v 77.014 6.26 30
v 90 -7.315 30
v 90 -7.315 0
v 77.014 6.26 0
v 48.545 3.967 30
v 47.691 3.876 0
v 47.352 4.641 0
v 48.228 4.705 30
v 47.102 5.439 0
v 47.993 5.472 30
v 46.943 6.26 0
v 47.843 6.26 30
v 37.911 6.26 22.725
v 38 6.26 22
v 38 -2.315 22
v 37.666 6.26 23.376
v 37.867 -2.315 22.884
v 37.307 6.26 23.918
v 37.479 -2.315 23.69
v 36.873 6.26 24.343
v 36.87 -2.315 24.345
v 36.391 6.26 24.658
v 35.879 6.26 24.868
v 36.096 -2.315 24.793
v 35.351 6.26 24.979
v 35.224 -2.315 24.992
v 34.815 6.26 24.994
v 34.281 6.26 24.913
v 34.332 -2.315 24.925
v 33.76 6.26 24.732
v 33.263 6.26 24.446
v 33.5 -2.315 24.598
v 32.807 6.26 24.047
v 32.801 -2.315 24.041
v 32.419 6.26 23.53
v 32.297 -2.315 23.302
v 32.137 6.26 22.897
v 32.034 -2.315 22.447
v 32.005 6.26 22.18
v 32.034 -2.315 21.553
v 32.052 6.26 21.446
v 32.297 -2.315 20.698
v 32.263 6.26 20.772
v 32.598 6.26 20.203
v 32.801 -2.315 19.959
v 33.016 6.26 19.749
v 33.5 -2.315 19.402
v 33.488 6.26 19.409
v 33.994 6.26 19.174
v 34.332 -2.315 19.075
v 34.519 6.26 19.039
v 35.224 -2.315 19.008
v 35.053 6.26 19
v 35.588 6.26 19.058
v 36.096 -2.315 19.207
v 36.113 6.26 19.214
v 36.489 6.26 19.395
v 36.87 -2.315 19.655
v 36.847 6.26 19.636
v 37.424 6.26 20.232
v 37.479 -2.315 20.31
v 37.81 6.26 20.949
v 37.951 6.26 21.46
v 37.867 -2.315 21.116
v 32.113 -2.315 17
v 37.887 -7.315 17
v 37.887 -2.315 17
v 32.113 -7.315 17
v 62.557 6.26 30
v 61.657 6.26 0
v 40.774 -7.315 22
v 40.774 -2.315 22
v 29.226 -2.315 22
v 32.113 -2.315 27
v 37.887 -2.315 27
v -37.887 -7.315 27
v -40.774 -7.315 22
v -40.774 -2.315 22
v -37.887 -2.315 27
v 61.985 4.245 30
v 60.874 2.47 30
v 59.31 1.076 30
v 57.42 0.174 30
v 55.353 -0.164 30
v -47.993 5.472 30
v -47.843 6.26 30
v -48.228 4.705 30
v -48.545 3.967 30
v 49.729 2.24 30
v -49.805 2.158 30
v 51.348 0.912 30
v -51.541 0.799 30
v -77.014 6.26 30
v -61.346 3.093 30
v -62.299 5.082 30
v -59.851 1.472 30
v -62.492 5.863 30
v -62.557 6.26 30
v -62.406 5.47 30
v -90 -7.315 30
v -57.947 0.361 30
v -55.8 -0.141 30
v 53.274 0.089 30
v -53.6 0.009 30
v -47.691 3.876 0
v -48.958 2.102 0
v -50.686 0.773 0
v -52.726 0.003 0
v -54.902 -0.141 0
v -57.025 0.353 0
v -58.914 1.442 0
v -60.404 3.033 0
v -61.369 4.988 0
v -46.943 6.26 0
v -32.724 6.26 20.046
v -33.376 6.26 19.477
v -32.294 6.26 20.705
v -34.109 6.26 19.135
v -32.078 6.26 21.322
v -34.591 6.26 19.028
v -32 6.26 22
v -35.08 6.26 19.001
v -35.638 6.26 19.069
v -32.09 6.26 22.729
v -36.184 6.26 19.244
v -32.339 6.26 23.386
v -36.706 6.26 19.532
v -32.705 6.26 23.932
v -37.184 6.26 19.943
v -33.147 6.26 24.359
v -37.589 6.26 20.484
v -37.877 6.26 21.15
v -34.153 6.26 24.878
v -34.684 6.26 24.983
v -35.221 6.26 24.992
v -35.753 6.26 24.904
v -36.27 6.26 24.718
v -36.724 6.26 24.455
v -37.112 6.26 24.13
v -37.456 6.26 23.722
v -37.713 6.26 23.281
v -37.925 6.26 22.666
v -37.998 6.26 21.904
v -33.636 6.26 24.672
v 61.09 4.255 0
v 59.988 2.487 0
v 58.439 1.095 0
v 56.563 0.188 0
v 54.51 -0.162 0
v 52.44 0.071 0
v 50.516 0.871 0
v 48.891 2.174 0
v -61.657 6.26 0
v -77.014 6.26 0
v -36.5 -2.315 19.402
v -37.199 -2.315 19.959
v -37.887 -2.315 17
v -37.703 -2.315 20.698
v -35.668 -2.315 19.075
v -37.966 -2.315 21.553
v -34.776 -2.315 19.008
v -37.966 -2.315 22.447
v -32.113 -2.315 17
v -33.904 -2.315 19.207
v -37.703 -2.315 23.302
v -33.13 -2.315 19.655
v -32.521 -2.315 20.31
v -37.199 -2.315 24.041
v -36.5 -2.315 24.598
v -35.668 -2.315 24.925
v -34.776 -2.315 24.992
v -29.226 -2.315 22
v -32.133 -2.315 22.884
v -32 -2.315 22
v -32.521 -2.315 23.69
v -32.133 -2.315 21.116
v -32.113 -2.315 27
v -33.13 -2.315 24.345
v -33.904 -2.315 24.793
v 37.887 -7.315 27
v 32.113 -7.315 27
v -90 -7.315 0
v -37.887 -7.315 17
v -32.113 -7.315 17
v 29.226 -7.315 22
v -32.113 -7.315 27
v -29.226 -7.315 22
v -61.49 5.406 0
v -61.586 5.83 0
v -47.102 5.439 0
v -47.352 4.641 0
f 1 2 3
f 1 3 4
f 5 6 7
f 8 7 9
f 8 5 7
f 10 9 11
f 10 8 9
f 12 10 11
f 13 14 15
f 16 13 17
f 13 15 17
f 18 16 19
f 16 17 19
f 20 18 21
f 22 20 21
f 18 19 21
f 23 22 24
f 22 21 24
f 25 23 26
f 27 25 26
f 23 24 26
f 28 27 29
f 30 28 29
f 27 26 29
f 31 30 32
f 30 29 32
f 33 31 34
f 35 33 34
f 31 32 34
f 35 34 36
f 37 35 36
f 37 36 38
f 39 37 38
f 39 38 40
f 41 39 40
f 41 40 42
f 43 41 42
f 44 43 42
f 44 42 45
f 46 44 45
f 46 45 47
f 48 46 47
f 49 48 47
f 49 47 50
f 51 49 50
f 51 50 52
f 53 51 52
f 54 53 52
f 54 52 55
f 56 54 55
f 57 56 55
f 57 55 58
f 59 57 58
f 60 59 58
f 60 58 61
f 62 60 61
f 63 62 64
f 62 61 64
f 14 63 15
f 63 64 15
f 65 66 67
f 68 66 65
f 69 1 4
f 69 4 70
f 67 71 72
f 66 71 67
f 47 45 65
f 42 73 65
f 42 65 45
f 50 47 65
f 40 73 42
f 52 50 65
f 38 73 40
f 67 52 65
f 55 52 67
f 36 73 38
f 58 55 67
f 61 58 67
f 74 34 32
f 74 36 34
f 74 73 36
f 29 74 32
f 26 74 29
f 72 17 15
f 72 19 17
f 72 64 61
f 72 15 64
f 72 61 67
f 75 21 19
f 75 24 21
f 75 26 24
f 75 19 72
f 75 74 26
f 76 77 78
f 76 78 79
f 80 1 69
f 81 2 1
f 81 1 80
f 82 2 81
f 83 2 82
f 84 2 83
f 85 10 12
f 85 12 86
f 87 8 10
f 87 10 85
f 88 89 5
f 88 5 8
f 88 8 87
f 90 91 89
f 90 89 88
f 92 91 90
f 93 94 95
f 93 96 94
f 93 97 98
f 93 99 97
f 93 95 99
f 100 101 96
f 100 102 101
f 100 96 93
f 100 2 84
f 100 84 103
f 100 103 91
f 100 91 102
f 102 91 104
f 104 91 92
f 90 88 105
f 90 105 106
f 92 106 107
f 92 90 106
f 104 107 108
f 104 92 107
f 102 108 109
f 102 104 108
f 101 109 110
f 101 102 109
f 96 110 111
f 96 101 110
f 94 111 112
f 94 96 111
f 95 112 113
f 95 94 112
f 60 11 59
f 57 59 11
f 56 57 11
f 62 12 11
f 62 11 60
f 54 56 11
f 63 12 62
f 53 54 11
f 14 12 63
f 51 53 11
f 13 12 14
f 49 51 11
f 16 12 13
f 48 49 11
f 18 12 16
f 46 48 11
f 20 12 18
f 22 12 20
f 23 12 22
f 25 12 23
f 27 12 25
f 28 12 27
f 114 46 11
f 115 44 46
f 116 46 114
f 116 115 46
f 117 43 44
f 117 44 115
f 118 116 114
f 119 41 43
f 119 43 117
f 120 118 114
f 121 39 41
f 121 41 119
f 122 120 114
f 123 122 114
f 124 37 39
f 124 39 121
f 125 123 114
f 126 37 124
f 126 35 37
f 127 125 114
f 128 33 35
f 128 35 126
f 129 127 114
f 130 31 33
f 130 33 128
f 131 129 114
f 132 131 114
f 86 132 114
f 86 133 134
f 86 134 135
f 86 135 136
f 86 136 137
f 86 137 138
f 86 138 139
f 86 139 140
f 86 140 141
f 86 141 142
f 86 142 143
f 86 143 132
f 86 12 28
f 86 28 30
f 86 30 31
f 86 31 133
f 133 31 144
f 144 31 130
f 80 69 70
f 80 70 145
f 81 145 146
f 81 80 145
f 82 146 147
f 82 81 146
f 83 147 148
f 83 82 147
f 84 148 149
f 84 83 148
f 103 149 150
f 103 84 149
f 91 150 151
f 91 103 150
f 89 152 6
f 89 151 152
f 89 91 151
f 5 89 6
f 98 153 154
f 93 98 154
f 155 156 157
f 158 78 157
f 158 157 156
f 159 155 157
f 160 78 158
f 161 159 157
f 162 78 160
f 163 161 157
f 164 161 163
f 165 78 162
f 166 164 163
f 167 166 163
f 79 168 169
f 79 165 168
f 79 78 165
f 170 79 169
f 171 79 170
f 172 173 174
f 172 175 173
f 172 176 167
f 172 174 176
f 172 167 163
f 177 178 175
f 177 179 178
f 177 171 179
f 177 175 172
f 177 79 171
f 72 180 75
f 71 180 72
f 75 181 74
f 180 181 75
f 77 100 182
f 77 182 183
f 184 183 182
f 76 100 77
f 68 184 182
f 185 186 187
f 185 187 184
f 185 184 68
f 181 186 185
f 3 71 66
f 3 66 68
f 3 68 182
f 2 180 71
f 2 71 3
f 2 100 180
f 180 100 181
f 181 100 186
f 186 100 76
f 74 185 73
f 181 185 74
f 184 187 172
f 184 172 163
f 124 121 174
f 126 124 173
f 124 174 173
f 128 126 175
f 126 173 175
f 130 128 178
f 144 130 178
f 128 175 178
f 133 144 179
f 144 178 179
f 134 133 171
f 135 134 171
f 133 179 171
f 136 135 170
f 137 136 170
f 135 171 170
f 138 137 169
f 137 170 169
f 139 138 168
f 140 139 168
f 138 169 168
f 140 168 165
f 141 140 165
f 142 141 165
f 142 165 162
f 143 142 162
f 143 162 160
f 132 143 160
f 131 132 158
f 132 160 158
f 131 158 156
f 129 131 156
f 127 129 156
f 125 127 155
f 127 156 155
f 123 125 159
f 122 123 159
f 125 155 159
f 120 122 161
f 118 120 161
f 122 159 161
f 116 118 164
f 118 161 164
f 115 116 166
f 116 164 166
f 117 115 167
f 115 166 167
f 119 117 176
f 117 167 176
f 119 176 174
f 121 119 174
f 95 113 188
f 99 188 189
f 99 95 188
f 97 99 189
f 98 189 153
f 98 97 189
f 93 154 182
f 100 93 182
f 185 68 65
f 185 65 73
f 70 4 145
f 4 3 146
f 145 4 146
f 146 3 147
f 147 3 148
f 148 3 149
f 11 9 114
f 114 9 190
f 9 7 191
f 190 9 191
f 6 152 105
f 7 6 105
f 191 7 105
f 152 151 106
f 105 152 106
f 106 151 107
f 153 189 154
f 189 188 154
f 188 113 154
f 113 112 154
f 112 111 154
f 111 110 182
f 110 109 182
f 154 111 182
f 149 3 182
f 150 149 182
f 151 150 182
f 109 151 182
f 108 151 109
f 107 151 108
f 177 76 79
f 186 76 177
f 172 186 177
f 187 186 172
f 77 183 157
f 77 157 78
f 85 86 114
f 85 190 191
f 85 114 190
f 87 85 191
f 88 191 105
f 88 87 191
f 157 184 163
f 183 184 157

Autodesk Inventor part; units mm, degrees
ref_plane "YZ Plane" through (0, 0, 0) normal (1, 0, 0) x (0, 1, 0)
ref_plane "XZ Plane" through (0, 0, 0) normal (0, 1, 0) x (-1, 0, 0)
sketch "Sketch1" plane through (0, 0, 0) normal (0, 0, 1) x (1, 0, 0)
  line L0 (90, -7.3153) -> (-90, -7.3153)
  line L1 (-90, -7.3153) -> (-77.0141, 6.2597)
  line L2 (-77.0141, 6.2597) -> (-61.6574, 6.2597)
  line L3 (77.0141, 6.2597) -> (90, -7.3153)
  line L4 (90, -7.3153) -> (-77.0141, 6.2597) construction
  line L5 (-90, -7.3153) -> (77.0141, 6.2597) construction
  line L6 (-76.0575, 7.2597) -> (77.8086, 7.2597) construction
  arc A0 (-46.9426, 6.2597) -> (-61.6574, 6.2597) centre (-54.3, 7.2597) ccw construction
  arc A1 (47.6907, 3.8763) -> (61.6574, 6.2597) centre (54.3, 7.2597) ccw
  line L7 (46.9426, 6.2597) -> (61.6574, 6.2597) construction
  line L8 (61.6574, 6.2597) -> (77.0141, 6.2597)
  arc A2 (46.9426, 6.2597) -> (47.6907, 3.8763) centre (54.3, 7.2597) ccw
  arc A3 (61.6574, 6.2597) -> (46.9426, 6.2597) centre (54.3, 7.2597) ccw construction
  line L9 (-61.6574, 6.2597) -> (-46.9426, 6.2597) construction
  line L10 (-46.9426, 6.2597) -> (46.9426, 6.2597)
  arc A4 (-47.6907, 3.8763) -> (-46.9426, 6.2597) centre (-54.3, 7.2597) ccw
  arc A5 (-61.369, 4.9881) -> (-47.6907, 3.8763) centre (-54.3, 7.2597) ccw
  arc A6 (-61.6574, 6.2597) -> (-61.369, 4.9881) centre (-54.3, 7.2597) ccw
  point P0 (0, 0)
  dimension "d0" = 1
  dimension "d1" = 14.85
  dimension "d2" = 54.3
  dimension "d3" = 108.6
  dimension "d5" = 180
  dimension "d6" = 22.7141
  dimension "d7" = 22.7141
  dimension "d8" = 14.575
ref_plane "Work Plane1" through (0, 0, 30) normal (0, 0, 1) x (1, 0, 0)
sketch "Sketch2" plane through (0, 0, 30) normal (0, 0, 1) x (1, 0, 0)
  line L0 (90, -7.3153) -> (-90, -7.3153) projected
  line L1 (-90, -7.3153) -> (-77.0141, 6.2597) projected
  line L2 (77.0141, 6.2597) -> (90, -7.3153) projected
  line L3 (62.5574, 6.2597) -> (77.0141, 6.2597)
  line L4 (-47.8426, 6.2597) -> (47.8426, 6.2597)
  line L5 (-77.0141, 6.2597) -> (-62.5574, 6.2597)
  line L6 (-76.0575, 7.2597) -> (77.8086, 7.2597) construction
  arc A0 (-62.5574, 6.2597) -> (-47.8426, 6.2597) centre (-55.2, 7.2597) ccw
  arc A1 (47.8426, 6.2597) -> (62.5574, 6.2597) centre (55.2, 7.2597) ccw
  point P0 (0, 0)
  dimension "d10" = 7.425
  dimension "d11" = 110.4
  dimension "d12" = 55.2
loft "Loft1" add profiles "Sketch1", "Sketch2"
sketch "Sketch8" plane through (-90, -7.3153, 0) normal (0, -1, 0) x (1, 0, 0)
  circle A0 centre (125, 22) radius 3
  circle A1 centre (55, 22) radius 3
  point P0 (90, 0)
  dimension "d31" = 35
  dimension "d32" = 35
  dimension "d33" = 22
  dimension "d34" = 22
  dimension "d35" = 6
extrude "Extrusion3" cut sketch "Sketch8" against normal through all
sketch "Sketch9" plane through (-90, -7.3153, 0) normal (0, -1, 0) x (1, 0, 0)
  circle A0 centre (125, 22) radius 3 projected
  circle A1 centre (55, 22) radius 3 projected
  line L0 (122.1132, 27) -> (127.8868, 27)
  line L1 (127.8868, 27) -> (130.7735, 22)
  line L2 (130.7735, 22) -> (127.8868, 17)
  line L3 (127.8868, 17) -> (122.1132, 17)
  line L4 (122.1132, 17) -> (119.2265, 22)
  line L5 (119.2265, 22) -> (122.1132, 27)
  line L6 (52.1132, 27) -> (57.8868, 27)
  line L7 (57.8868, 27) -> (60.7735, 22)
  line L8 (60.7735, 22) -> (57.8868, 17)
  line L9 (57.8868, 17) -> (52.1132, 17)
  line L10 (52.1132, 17) -> (49.2265, 22)
  line L11 (49.2265, 22) -> (52.1132, 27)
  point P0 (90, 0)
  dimension "d38" = 10
extrude "Extrusion4" cut sketch "Sketch9" against normal blind 5 and the other way blind 100
equation "\"d2\" = 0.5 * d3"
equation "\"d5\" = topWidth"
equation "\"d7\" = d6"
equation "\"d10\" = 0.5 * d1"
equation "\"d12\" = 0.5 * d11"
equation "\"d32\" = d31"
equation "\"d34\" = d33"
equation "\"topWidth\" = 180"
properties part number "Bar_Mount_Bottom"
